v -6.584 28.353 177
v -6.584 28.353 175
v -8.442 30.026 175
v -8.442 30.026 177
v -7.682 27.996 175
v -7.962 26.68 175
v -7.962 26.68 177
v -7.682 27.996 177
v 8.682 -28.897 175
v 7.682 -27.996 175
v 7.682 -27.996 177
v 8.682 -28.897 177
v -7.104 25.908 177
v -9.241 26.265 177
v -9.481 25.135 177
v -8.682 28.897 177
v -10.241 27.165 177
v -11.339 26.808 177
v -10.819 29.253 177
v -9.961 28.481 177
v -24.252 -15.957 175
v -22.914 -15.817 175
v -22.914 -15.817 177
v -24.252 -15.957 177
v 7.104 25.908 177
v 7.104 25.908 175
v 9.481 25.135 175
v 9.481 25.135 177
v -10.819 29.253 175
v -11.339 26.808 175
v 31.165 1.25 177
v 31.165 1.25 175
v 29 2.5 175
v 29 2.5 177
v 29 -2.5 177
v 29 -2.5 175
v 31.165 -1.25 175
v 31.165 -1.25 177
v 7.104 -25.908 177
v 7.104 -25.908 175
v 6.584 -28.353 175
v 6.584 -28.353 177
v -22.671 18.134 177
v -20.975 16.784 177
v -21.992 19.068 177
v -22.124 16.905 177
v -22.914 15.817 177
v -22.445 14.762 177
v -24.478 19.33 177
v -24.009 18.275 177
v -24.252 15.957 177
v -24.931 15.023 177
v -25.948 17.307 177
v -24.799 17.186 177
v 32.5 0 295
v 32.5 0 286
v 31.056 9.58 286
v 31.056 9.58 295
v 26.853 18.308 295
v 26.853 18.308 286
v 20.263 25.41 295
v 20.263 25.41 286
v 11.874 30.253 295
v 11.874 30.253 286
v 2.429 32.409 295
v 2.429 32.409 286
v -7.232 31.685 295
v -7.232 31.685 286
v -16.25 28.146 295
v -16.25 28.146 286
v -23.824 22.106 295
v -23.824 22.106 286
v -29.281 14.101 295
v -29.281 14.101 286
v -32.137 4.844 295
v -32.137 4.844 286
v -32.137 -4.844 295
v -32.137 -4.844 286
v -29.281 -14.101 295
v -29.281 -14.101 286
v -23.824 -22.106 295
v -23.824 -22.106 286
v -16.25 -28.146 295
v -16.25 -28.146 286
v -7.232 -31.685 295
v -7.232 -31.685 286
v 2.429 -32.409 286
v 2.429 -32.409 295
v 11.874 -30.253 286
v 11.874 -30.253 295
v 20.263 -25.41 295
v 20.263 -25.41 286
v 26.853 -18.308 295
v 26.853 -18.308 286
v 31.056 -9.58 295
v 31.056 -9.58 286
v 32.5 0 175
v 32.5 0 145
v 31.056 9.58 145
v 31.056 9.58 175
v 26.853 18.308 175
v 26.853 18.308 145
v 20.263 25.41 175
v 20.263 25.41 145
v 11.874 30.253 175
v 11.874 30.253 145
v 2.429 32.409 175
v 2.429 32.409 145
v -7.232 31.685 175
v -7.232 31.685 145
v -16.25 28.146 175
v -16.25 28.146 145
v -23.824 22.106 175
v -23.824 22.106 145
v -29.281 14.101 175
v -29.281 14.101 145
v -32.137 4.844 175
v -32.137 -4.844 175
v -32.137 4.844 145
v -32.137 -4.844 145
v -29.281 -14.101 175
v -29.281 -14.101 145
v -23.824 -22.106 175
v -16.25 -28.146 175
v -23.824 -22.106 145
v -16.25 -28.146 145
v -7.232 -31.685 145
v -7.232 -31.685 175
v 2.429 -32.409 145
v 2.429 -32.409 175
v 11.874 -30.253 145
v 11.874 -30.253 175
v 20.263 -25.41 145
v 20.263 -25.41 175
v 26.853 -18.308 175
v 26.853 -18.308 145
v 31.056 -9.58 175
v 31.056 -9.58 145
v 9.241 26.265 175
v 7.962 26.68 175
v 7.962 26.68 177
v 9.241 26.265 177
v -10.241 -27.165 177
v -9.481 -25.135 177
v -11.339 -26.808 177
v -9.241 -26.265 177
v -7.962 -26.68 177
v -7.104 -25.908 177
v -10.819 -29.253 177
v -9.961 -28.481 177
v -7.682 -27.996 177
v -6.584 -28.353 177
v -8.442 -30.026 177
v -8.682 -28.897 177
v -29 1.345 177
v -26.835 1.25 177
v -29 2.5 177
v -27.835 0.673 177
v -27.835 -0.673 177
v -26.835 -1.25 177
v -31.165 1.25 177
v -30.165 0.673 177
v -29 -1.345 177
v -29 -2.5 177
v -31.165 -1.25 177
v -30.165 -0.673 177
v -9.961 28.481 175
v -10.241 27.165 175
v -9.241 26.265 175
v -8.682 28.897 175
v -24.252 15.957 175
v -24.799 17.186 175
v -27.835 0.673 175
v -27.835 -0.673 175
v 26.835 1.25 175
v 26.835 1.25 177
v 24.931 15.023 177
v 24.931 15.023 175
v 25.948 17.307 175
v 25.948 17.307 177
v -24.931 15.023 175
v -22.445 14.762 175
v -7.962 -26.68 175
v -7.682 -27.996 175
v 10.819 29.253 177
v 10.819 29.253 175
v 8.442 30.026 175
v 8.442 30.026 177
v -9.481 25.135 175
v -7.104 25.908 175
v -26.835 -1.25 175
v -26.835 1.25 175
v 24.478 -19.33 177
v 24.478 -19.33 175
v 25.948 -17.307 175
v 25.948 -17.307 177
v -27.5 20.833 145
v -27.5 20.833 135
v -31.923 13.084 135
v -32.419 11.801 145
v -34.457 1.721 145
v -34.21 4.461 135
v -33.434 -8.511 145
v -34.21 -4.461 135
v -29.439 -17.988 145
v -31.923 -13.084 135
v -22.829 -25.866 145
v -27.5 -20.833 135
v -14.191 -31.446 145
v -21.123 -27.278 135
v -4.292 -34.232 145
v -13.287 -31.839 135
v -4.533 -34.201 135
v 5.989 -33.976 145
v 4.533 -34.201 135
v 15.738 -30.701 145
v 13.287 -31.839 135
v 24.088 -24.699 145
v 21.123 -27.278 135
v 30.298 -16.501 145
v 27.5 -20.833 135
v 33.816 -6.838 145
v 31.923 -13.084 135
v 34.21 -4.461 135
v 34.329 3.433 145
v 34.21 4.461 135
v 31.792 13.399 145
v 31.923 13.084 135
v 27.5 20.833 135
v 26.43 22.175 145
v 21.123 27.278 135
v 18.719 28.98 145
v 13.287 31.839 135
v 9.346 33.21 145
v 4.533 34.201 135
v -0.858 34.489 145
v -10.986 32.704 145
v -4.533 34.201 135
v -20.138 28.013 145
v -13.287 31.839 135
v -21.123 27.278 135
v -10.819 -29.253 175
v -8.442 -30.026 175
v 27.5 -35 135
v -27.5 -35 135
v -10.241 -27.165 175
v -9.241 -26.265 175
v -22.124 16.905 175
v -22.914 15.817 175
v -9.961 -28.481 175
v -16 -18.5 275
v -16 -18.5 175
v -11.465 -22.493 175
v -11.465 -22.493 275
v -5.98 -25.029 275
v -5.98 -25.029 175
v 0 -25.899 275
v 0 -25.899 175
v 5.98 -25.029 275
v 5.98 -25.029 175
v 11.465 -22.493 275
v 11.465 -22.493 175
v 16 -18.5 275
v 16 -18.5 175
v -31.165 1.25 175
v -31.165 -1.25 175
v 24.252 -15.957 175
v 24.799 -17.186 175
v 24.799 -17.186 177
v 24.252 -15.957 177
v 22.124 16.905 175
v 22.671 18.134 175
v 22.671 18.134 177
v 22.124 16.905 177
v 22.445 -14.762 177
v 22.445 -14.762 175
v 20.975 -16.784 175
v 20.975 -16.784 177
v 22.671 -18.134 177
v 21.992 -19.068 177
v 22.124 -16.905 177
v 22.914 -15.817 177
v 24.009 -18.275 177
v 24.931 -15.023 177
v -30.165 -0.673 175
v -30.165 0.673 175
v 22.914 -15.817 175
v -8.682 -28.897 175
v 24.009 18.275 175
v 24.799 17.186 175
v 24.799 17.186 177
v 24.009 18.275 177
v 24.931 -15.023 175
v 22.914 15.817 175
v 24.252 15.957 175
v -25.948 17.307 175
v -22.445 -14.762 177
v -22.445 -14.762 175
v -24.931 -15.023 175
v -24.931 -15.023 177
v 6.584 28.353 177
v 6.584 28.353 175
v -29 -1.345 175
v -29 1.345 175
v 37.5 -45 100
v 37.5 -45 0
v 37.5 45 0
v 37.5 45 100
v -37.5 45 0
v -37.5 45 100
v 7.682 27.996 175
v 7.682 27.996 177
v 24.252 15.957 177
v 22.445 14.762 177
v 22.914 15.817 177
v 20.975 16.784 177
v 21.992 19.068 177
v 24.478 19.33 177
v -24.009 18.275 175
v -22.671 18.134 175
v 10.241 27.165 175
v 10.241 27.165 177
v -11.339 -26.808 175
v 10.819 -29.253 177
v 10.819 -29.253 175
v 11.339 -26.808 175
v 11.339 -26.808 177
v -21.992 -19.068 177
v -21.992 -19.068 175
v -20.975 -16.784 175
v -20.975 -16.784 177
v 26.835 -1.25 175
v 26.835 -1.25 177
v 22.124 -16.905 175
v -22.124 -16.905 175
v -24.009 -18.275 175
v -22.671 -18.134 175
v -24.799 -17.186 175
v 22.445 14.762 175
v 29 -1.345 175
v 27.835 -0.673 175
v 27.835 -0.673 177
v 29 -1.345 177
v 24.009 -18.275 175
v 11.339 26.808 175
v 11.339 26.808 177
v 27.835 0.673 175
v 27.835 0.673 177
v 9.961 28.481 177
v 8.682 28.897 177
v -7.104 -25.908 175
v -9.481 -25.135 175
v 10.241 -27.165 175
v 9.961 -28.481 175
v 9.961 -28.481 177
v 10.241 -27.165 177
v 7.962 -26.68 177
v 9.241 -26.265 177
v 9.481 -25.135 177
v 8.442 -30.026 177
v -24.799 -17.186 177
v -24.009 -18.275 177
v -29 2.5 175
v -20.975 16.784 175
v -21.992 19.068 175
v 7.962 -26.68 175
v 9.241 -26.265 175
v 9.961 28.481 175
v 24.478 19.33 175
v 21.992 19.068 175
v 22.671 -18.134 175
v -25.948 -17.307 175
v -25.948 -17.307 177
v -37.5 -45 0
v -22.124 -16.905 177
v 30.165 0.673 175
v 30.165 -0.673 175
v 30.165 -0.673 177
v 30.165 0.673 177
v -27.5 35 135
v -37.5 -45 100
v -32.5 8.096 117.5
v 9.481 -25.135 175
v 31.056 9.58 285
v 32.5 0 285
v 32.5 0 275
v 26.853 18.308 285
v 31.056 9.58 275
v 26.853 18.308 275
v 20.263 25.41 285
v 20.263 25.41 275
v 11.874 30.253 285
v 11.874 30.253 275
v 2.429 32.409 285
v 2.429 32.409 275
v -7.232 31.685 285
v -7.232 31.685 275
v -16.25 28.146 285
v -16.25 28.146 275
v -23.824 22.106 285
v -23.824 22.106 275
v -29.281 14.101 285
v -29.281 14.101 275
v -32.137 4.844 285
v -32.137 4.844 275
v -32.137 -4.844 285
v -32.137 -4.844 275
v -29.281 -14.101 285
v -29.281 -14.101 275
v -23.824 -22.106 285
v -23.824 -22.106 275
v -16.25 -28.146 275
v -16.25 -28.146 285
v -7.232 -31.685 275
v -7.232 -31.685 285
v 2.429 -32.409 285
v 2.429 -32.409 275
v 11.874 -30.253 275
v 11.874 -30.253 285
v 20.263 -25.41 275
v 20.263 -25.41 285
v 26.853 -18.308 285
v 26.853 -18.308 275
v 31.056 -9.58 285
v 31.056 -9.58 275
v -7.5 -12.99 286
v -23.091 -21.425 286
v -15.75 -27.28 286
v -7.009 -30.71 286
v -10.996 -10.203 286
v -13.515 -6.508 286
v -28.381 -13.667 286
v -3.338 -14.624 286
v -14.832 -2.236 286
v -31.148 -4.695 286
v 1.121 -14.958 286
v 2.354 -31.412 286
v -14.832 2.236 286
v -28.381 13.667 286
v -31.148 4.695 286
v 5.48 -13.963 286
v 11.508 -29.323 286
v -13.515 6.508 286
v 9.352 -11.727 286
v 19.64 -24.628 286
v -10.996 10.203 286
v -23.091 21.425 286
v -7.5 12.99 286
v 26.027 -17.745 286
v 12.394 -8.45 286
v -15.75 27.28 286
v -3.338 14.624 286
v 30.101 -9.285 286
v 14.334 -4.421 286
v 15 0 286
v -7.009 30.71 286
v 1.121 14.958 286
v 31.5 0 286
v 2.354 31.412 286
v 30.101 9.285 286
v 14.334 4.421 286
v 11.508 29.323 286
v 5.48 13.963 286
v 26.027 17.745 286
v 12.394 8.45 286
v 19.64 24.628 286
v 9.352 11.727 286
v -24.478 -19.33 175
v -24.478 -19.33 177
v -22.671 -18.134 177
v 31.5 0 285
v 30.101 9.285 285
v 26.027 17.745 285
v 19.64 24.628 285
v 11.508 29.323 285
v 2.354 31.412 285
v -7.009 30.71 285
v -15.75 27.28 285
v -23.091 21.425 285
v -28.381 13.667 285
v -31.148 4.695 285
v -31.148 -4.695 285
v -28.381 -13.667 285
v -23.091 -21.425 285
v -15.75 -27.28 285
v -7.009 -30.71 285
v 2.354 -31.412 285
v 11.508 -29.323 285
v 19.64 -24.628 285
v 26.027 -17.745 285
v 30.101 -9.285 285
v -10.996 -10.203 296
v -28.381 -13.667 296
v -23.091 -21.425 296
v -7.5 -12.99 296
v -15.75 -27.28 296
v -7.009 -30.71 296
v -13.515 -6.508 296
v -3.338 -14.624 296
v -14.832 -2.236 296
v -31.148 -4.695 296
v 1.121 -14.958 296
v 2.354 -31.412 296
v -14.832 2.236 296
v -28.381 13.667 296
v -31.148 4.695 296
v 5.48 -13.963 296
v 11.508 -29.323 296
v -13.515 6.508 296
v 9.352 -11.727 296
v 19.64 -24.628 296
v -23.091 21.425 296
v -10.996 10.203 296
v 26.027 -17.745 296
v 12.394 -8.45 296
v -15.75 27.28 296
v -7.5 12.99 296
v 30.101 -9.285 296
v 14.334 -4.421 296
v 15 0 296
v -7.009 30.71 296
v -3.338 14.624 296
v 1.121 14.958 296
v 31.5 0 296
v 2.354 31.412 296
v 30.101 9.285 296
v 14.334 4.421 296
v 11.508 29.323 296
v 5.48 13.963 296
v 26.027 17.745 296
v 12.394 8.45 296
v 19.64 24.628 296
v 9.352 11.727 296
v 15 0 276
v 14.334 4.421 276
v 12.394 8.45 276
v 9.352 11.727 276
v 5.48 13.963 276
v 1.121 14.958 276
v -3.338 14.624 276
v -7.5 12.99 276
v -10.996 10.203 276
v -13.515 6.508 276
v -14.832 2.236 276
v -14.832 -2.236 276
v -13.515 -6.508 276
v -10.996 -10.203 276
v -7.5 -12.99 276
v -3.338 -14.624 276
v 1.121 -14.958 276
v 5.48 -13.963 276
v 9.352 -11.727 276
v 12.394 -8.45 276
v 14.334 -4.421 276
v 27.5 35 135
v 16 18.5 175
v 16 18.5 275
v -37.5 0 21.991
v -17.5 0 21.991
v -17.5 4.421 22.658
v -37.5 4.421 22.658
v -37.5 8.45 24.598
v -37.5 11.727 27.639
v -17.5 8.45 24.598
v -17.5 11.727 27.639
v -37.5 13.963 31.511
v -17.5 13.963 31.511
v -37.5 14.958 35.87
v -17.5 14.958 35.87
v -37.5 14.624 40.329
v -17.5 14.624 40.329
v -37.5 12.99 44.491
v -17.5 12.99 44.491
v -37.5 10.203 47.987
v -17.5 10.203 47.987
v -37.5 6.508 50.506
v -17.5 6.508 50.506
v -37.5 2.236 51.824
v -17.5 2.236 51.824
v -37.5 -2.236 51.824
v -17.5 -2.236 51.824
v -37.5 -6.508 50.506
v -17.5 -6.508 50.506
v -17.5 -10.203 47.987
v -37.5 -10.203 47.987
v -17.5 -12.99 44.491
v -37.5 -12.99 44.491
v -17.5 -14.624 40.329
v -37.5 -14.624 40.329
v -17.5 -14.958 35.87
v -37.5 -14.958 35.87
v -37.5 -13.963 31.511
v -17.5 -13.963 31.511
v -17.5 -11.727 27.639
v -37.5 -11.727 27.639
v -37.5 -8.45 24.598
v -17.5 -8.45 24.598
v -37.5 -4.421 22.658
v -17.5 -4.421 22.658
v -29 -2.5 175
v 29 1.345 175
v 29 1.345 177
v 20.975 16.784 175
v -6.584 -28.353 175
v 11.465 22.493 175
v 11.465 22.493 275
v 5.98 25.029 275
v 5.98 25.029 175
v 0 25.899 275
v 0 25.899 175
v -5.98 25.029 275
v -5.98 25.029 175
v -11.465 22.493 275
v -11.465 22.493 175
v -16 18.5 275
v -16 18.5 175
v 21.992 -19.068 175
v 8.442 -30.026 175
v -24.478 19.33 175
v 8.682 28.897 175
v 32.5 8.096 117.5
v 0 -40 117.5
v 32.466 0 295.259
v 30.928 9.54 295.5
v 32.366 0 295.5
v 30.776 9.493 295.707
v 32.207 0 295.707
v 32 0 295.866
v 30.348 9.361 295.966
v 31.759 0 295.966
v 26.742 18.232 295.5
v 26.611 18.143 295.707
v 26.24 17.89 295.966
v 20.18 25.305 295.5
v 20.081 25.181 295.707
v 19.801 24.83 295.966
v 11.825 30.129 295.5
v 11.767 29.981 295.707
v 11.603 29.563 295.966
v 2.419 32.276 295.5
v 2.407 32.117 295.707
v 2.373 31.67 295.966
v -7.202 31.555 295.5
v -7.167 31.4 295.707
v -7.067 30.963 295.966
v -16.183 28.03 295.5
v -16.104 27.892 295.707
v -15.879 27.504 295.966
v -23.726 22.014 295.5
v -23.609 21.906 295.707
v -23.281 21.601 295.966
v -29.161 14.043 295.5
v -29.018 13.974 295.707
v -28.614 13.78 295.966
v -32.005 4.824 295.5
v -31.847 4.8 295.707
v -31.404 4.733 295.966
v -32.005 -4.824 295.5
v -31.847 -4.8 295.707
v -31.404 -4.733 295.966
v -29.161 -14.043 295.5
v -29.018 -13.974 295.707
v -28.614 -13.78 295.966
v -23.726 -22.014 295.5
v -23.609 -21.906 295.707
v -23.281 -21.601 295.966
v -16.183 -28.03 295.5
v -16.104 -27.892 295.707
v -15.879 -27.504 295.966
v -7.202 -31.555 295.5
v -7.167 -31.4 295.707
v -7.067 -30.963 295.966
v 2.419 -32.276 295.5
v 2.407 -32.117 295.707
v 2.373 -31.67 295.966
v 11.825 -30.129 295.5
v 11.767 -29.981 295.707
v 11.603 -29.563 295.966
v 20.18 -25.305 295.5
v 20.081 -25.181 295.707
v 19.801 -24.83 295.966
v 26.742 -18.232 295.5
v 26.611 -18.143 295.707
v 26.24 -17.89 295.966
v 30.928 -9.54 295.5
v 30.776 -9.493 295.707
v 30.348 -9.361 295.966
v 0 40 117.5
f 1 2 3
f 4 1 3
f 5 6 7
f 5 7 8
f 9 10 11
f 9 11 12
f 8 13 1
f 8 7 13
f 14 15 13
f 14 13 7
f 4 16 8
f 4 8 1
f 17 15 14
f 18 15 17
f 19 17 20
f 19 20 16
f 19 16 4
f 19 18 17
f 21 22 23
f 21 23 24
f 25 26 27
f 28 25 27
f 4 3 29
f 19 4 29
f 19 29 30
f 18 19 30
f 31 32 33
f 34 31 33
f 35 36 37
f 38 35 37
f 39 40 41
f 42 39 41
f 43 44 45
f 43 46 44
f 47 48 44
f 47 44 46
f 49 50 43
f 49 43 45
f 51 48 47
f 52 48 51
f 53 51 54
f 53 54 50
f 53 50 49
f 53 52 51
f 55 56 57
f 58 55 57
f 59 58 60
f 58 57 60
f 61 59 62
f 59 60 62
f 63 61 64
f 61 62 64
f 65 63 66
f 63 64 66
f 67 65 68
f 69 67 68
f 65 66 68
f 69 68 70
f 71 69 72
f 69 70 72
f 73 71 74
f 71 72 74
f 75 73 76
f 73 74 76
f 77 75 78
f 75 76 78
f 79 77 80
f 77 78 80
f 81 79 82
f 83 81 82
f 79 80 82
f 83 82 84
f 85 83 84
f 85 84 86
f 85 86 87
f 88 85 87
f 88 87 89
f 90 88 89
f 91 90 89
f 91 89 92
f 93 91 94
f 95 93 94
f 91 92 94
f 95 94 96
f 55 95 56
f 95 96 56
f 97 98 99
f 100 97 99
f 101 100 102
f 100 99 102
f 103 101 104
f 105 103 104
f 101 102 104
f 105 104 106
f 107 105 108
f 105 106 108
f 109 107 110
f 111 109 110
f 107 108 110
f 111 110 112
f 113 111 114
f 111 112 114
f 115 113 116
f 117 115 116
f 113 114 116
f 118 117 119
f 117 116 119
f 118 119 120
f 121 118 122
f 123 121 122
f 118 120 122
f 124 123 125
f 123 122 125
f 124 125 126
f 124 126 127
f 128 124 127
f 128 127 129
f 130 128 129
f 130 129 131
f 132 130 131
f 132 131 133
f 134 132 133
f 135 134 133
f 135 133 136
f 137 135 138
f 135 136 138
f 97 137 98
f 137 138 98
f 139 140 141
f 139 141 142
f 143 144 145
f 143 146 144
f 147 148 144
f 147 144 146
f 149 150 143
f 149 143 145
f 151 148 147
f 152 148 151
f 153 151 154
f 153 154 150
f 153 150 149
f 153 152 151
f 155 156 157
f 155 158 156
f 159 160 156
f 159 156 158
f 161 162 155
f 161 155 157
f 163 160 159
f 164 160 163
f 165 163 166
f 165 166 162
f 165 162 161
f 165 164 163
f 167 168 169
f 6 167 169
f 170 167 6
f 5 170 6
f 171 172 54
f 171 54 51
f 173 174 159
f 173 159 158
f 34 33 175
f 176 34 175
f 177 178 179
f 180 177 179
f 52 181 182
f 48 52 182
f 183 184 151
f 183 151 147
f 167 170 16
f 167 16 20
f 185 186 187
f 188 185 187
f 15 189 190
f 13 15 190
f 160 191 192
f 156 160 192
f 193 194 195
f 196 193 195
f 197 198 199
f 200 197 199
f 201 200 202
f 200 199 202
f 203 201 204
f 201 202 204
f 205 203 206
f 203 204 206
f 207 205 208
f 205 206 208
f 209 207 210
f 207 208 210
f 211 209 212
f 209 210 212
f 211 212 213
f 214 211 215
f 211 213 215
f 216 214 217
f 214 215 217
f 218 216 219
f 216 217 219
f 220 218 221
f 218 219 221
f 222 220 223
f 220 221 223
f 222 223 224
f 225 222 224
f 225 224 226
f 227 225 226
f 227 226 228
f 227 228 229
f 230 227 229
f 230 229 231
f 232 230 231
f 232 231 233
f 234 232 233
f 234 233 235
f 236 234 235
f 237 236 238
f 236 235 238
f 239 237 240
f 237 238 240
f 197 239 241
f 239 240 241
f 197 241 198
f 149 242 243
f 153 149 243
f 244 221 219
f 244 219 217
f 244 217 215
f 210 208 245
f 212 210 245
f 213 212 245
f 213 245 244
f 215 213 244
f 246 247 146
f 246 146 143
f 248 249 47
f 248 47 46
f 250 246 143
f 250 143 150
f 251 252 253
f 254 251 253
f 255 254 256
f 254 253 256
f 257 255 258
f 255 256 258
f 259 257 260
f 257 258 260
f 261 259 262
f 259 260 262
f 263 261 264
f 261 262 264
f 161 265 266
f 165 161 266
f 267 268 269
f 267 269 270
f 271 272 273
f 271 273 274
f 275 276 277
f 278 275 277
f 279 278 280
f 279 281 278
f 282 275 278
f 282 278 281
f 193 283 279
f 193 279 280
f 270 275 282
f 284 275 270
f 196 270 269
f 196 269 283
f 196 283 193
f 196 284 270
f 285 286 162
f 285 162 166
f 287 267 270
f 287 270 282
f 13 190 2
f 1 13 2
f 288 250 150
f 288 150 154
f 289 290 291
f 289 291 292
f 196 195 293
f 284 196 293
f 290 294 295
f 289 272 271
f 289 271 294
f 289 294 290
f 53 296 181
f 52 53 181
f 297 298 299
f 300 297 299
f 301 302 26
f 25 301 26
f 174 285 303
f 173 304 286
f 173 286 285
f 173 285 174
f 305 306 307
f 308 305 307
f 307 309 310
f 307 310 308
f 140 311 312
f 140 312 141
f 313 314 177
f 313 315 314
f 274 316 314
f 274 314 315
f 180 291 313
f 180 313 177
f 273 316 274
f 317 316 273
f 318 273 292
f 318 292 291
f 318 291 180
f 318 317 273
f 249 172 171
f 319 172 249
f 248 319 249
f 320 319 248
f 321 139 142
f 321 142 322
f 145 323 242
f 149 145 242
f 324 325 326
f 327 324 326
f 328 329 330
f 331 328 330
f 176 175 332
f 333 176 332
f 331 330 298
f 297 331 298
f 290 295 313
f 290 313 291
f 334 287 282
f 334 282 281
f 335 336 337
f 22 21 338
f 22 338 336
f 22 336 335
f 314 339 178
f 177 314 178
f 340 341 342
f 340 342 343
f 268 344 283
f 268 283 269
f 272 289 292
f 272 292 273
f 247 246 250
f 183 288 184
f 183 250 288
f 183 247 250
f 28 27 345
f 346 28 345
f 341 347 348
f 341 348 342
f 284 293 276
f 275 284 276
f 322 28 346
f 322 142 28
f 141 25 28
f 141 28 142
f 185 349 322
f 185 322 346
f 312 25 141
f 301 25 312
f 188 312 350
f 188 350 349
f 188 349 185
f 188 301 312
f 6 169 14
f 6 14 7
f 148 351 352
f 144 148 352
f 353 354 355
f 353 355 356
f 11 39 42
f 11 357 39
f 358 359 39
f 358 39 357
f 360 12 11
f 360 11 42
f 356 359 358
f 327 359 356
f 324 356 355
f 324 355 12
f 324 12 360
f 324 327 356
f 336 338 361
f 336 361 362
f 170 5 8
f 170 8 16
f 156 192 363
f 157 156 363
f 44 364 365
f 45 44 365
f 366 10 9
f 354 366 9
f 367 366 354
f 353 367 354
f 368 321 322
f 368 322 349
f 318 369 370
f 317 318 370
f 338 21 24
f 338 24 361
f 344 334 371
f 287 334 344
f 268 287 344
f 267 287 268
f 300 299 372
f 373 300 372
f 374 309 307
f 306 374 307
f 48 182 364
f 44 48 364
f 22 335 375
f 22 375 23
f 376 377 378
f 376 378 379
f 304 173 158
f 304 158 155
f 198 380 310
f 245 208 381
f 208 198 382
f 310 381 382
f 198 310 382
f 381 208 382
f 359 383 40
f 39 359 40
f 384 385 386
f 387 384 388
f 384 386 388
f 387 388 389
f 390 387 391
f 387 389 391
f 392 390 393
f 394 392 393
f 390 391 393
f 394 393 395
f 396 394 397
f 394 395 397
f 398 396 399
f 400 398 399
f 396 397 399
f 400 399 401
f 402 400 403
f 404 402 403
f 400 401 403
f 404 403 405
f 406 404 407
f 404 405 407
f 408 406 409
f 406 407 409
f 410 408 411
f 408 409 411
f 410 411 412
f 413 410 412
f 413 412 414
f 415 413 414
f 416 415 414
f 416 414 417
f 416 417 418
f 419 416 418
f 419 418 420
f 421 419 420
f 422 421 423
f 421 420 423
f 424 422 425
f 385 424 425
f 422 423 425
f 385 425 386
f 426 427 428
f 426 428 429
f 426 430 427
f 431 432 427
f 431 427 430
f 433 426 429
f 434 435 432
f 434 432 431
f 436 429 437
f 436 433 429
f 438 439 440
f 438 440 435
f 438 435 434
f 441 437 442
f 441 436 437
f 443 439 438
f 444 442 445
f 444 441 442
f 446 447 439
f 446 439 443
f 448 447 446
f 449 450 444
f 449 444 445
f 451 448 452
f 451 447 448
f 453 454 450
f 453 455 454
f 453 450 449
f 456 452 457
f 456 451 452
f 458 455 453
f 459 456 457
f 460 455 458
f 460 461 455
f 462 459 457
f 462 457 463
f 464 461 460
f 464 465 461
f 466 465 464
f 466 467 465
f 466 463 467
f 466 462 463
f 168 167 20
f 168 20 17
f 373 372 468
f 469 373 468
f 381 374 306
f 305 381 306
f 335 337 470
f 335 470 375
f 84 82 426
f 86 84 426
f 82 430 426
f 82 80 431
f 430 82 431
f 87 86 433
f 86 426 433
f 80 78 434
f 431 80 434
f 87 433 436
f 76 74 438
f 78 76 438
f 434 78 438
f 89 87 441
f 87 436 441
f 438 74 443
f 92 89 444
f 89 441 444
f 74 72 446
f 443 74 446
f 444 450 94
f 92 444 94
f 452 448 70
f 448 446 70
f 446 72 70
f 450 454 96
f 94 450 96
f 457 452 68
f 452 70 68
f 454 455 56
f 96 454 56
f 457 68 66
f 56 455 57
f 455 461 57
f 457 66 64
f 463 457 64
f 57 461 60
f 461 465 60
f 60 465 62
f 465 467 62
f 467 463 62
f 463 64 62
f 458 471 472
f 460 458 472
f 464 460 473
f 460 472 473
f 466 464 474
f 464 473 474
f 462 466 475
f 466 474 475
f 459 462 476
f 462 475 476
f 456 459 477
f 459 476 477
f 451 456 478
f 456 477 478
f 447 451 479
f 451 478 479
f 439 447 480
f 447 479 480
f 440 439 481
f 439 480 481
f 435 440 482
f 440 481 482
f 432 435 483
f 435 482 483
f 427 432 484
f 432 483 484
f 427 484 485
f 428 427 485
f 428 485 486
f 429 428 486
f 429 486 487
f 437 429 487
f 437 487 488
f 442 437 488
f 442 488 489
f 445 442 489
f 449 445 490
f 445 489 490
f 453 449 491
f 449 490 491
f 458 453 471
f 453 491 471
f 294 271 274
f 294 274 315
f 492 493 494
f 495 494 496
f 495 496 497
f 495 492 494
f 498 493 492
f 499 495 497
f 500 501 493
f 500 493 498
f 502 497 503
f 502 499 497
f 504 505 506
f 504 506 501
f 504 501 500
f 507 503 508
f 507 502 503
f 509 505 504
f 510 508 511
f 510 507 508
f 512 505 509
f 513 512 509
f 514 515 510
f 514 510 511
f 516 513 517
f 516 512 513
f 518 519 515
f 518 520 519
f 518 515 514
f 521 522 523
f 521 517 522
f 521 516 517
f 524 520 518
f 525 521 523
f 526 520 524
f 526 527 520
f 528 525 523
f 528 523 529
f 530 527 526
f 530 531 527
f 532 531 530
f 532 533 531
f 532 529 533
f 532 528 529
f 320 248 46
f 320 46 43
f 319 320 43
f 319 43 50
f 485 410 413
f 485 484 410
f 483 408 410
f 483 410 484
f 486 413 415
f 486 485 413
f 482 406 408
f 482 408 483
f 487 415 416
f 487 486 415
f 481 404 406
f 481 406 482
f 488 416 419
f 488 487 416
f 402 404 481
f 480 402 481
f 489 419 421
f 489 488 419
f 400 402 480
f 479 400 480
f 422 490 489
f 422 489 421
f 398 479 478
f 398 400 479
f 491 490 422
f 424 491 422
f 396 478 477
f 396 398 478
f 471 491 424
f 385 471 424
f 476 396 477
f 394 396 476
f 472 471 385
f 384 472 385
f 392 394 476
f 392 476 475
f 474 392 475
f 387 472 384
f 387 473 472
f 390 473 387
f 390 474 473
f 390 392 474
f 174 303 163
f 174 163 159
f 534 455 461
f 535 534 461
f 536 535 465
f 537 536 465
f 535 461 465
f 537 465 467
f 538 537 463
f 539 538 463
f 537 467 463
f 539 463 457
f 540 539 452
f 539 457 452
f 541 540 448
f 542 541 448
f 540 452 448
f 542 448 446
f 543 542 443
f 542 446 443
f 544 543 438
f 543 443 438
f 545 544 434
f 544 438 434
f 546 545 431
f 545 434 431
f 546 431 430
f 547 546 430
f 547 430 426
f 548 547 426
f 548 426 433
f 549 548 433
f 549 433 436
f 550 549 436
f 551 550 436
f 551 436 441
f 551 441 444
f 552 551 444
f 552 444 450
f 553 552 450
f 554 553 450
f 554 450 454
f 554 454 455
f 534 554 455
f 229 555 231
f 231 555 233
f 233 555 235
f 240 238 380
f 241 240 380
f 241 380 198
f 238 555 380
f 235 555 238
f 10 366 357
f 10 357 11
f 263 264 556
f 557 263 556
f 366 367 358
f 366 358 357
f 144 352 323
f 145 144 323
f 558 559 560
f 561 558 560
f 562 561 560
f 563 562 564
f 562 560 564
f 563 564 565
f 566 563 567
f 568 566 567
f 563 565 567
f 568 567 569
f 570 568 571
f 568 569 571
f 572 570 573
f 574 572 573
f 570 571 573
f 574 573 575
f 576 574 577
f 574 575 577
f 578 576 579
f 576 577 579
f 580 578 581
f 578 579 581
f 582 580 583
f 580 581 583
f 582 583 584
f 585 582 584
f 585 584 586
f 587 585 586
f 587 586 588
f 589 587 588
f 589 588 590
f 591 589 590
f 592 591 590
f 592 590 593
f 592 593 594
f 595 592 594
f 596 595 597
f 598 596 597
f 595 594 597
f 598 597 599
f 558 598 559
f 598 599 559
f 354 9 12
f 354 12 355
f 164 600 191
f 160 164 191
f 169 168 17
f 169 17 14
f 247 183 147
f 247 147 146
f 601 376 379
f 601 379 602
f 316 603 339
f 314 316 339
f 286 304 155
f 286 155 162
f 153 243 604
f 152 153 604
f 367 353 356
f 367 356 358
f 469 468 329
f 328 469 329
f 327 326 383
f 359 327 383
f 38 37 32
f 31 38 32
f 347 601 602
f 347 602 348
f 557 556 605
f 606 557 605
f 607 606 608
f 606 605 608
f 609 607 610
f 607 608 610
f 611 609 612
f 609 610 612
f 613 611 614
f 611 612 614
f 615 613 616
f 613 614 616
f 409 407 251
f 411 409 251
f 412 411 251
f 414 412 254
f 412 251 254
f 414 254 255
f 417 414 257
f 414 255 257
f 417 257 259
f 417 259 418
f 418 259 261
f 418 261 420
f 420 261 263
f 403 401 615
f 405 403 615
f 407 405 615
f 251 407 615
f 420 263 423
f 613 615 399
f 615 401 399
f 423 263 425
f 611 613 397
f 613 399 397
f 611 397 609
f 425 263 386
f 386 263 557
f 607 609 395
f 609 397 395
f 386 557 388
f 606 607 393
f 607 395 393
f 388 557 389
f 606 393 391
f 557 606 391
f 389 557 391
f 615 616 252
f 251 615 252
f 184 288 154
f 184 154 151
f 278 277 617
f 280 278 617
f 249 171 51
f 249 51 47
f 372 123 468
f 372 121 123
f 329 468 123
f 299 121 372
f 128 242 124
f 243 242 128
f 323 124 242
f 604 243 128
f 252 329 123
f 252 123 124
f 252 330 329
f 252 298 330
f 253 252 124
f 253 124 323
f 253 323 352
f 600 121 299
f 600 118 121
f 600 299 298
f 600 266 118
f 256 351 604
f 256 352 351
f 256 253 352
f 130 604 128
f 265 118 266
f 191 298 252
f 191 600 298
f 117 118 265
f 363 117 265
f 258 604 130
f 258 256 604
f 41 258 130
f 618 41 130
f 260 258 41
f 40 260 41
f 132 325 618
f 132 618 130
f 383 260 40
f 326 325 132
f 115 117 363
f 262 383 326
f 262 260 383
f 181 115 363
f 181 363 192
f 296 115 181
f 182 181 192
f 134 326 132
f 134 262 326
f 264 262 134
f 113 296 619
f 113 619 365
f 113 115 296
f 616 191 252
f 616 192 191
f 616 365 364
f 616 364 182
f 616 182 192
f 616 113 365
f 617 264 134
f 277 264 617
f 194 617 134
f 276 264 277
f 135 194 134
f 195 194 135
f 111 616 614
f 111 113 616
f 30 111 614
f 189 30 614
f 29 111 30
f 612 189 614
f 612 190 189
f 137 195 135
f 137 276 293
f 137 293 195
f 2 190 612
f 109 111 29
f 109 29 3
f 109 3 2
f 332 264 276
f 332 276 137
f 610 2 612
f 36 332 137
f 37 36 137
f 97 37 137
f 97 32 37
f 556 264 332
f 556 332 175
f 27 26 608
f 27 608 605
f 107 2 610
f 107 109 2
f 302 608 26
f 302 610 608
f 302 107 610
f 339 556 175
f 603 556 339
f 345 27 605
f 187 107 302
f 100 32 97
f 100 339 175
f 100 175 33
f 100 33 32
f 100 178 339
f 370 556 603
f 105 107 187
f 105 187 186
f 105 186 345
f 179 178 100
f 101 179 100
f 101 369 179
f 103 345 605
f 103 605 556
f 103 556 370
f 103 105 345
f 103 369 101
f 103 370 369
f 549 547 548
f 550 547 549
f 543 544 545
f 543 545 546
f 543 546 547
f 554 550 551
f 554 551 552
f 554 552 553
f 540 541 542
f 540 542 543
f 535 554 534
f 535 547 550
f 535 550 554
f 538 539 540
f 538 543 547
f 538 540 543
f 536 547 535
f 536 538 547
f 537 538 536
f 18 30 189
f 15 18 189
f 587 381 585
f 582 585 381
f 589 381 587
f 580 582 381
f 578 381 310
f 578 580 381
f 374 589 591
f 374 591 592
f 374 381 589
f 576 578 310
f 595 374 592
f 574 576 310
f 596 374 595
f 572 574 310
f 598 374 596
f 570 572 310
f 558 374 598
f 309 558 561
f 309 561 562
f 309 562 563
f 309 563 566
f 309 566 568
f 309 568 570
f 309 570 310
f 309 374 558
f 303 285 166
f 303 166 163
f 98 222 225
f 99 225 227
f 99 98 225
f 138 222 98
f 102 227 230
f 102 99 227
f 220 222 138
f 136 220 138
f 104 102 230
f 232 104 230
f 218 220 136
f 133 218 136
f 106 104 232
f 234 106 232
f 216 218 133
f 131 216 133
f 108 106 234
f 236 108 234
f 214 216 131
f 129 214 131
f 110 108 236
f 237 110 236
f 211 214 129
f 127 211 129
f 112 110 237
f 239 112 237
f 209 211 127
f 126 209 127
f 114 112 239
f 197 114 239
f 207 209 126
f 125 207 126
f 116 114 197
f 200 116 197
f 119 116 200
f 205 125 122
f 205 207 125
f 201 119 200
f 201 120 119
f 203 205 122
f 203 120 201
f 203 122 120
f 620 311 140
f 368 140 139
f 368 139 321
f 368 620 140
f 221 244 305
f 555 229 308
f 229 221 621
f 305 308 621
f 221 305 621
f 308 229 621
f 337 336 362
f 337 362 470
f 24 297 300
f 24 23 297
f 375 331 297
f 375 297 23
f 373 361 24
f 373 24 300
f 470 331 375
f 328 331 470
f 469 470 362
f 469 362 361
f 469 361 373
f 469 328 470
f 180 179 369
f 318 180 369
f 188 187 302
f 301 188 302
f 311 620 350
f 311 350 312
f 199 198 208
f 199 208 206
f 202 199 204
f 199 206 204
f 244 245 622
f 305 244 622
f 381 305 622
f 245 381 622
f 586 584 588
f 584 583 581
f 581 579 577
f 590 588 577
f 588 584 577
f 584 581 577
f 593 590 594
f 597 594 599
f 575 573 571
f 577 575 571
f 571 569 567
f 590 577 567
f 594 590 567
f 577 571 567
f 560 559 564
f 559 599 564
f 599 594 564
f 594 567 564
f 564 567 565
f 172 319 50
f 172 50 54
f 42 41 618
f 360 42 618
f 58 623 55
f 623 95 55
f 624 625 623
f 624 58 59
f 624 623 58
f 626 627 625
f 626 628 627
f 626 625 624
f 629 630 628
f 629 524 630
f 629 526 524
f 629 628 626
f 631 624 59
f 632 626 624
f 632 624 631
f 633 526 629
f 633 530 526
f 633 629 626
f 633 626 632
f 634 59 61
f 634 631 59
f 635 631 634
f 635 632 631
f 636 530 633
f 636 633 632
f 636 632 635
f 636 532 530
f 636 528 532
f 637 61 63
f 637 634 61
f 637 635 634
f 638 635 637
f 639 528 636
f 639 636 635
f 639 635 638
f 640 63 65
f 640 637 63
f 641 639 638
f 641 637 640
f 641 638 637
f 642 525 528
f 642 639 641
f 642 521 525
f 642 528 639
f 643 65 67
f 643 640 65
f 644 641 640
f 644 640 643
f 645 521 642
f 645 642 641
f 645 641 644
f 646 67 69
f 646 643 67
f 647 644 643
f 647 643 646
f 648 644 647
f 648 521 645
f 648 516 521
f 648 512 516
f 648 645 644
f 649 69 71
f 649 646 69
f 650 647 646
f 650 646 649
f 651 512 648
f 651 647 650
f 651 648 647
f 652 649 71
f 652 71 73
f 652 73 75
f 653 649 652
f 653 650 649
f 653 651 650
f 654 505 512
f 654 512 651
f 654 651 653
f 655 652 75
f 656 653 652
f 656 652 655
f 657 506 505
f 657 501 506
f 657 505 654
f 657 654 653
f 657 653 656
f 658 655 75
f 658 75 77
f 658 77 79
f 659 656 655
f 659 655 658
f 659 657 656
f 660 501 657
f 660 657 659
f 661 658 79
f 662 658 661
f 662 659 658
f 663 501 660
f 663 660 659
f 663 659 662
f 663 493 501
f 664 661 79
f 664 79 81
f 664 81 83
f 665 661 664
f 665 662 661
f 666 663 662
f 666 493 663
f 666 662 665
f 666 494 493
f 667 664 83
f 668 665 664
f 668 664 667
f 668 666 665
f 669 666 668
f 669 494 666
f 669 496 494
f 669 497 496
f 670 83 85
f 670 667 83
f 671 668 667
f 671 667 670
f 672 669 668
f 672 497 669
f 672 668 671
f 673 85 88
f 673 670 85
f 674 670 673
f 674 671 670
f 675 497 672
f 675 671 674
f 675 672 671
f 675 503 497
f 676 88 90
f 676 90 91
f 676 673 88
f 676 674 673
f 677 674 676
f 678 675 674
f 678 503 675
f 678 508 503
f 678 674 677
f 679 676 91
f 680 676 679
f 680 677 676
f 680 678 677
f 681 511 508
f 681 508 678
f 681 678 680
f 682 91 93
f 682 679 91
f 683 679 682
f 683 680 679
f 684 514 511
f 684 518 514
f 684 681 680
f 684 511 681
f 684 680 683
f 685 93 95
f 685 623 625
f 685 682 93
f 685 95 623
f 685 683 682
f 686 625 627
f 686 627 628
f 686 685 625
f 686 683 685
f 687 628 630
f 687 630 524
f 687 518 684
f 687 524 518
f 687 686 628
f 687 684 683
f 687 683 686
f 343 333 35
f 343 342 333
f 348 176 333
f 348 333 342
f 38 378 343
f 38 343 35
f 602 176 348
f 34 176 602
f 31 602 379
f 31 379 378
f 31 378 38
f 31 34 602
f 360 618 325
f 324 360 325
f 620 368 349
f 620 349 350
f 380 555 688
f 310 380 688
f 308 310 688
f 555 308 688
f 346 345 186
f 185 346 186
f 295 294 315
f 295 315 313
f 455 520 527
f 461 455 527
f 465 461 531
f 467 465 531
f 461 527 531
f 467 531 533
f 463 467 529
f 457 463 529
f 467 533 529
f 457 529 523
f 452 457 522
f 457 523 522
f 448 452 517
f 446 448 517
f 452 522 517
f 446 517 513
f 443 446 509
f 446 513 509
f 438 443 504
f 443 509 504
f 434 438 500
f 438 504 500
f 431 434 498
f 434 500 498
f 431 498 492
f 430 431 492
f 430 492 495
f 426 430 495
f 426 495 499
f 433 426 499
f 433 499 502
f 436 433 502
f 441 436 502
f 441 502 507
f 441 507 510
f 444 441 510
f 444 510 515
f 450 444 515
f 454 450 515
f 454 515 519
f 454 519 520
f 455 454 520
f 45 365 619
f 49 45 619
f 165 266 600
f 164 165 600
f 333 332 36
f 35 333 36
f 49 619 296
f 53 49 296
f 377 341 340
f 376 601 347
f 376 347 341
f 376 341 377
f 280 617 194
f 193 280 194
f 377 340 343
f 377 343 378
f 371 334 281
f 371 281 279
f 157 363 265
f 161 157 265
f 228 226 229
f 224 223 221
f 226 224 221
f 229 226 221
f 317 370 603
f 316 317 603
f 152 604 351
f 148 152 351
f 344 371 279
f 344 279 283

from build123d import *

# Parameters (mm, degrees)
SKETCH1_W           = 75
SKETCH1_H           = 90
BOSS_EXTRUDE1_DEPTH = 100
SKETCH4_R           = 34.5
BOSS_EXTRUDE2_DEPTH = 10
SKETCH5_R           = 32.5
BOSS_EXTRUDE3_DEPTH = 30
BOSS_EXTRUDE4_DEPTH = 2
CIRPATTERN1_COUNT   = 10
BOSS_EXTRUDE5_DEPTH = 100
SKETCH8_R           = 32.5
BOSS_EXTRUDE6_DEPTH = 10
SKETCH9_R           = 31.5
BOSS_EXTRUDE7_DEPTH = 1
SKETCH10_R          = 32.5
BOSS_EXTRUDE8_DEPTH = 10
FILLET2_R           = 1
SKETCH15_R          = 15
CUT_EXTRUDE2_DEPTH  = 20
CUT_EXTRUDE3_START  = -17.5
SKETCH16_R          = 15
CUT_EXTRUDE3_DEPTH  = 20


with BuildPart() as part:
    # Sketch1 → Boss-Extrude1 (new body)
    with BuildSketch(Plane.XY):
        Rectangle(SKETCH1_W, SKETCH1_H)
    extrude(amount=BOSS_EXTRUDE1_DEPTH)

    # Sketch3 → Loft1 section 0
    with BuildSketch(Plane.XY.offset(135)):
        with BuildLine():
            Line((27.5, 35), (-27.5, 35))
            Line((-27.5, 35), (-27.5, -35))
            Line((-27.5, -35), (27.5, -35))
            Line((27.5, -35), (27.5, 35))
        make_face()
    # Sketch2 → Loft1 section 1
    with BuildSketch(Plane.XY.offset(100)):
        with BuildLine():
            Line((37.5, 45), (-37.5, 45))
            Line((-37.5, 45), (-37.5, -45))
            Line((-37.5, -45), (37.5, -45))
            Line((37.5, -45), (37.5, 45))
        make_face()
    loft()

    # Sketch4 → Boss-Extrude2 (add)
    with BuildSketch(Plane.XY.offset(135)):
        with Locations(Location((0, 0, 0), (0, 0, 142.854195828))):
            Circle(SKETCH4_R)
    extrude(amount=BOSS_EXTRUDE2_DEPTH)

    # Sketch5 → Boss-Extrude3 (add)
    with BuildSketch(Plane.XY.offset(145)):
        Circle(SKETCH5_R)
    extrude(amount=BOSS_EXTRUDE3_DEPTH)

    # Sketch6 → Boss-Extrude4 (add)
    with BuildSketch(Plane.XY.offset(175)):
        Polygon((29, 2.5), (26.834936491, 1.25), (26.834936491, -1.25), (29, -2.5), (31.165063509, -1.25), (31.165063509, 1.25), align=None)
        Polygon((29, 1.345299462), (27.834936491, 0.672649731), (27.834936491, -0.672649731), (29, -1.345299462), (30.165063509, -0.672649731), (30.165063509, 0.672649731), align=None, mode=Mode.SUBTRACT)
    boss_extrude4 = extrude(amount=BOSS_EXTRUDE4_DEPTH)

    # CirPattern1: Boss-Extrude4 ×10 about axis
    cirpattern1_axis = Axis((0, 0, 0), (0, 0, 1))
    for i in range(1, CIRPATTERN1_COUNT):
        add(boss_extrude4.rotate(cirpattern1_axis, i * 360 / CIRPATTERN1_COUNT))

    # Sketch7 → Boss-Extrude5 (add)
    with BuildSketch(Plane.XY.offset(175)):
        with BuildLine():
            Line((16, -18.5), (16, 18.5))
            ThreePointArc((16, 18.5), (0, 25.898529491), (-16, 18.5))
            Line((-16, 18.5), (-16, -18.5))
            ThreePointArc((-16, -18.5), (0, -25.898529491), (16, -18.5))
        make_face()
    extrude(amount=BOSS_EXTRUDE5_DEPTH)

    # Sketch8 → Boss-Extrude6 (add)
    with BuildSketch(Plane.XY.offset(275)):
        Circle(SKETCH8_R)
    extrude(amount=BOSS_EXTRUDE6_DEPTH)

    # Sketch9 → Boss-Extrude7 (add)
    with BuildSketch(Plane.XY.offset(285)):
        Circle(SKETCH9_R)
    extrude(amount=BOSS_EXTRUDE7_DEPTH)


with BuildPart() as body_2:
    # Sketch10 → Boss-Extrude8 (new body)
    with BuildSketch(Plane.XY.offset(286)):
        Circle(SKETCH10_R)
    extrude(amount=BOSS_EXTRUDE8_DEPTH)

    # Fillet2
    fillet2_edges = [body_2.edges().sort_by_distance(p)[0] for p in [
        (-32.5, 0, 296),
    ]]
    fillet(fillet2_edges, radius=FILLET2_R)


with BuildPart() as cut_extrude2_tool:
    # Sketch15 → Cut-Extrude2 (new body)
    with BuildSketch(Plane.XY.offset(296)):
        Circle(SKETCH15_R)
    extrude(amount=-CUT_EXTRUDE2_DEPTH)


with BuildPart() as part_1:
    add(part.part)

    # Cut-Extrude2: cut by cut_extrude2_tool
    add(cut_extrude2_tool.part, mode=Mode.SUBTRACT)

    # Sketch16 → Cut-Extrude3 (cut)
    with BuildSketch(Plane(origin=(0, 0, 0), x_dir=(0, 0, -1), z_dir=(1, 0, 0)).offset(CUT_EXTRUDE3_START)):
        with Locations((-36.991386067, 0)):
            Circle(SKETCH16_R)
    extrude(amount=-CUT_EXTRUDE3_DEPTH, mode=Mode.SUBTRACT)


with BuildPart() as body_2_1:
    add(body_2.part)

    # Cut-Extrude2: cut by cut_extrude2_tool
    add(cut_extrude2_tool.part, mode=Mode.SUBTRACT)


solid = Compound([part_1.part, body_2_1.part])
